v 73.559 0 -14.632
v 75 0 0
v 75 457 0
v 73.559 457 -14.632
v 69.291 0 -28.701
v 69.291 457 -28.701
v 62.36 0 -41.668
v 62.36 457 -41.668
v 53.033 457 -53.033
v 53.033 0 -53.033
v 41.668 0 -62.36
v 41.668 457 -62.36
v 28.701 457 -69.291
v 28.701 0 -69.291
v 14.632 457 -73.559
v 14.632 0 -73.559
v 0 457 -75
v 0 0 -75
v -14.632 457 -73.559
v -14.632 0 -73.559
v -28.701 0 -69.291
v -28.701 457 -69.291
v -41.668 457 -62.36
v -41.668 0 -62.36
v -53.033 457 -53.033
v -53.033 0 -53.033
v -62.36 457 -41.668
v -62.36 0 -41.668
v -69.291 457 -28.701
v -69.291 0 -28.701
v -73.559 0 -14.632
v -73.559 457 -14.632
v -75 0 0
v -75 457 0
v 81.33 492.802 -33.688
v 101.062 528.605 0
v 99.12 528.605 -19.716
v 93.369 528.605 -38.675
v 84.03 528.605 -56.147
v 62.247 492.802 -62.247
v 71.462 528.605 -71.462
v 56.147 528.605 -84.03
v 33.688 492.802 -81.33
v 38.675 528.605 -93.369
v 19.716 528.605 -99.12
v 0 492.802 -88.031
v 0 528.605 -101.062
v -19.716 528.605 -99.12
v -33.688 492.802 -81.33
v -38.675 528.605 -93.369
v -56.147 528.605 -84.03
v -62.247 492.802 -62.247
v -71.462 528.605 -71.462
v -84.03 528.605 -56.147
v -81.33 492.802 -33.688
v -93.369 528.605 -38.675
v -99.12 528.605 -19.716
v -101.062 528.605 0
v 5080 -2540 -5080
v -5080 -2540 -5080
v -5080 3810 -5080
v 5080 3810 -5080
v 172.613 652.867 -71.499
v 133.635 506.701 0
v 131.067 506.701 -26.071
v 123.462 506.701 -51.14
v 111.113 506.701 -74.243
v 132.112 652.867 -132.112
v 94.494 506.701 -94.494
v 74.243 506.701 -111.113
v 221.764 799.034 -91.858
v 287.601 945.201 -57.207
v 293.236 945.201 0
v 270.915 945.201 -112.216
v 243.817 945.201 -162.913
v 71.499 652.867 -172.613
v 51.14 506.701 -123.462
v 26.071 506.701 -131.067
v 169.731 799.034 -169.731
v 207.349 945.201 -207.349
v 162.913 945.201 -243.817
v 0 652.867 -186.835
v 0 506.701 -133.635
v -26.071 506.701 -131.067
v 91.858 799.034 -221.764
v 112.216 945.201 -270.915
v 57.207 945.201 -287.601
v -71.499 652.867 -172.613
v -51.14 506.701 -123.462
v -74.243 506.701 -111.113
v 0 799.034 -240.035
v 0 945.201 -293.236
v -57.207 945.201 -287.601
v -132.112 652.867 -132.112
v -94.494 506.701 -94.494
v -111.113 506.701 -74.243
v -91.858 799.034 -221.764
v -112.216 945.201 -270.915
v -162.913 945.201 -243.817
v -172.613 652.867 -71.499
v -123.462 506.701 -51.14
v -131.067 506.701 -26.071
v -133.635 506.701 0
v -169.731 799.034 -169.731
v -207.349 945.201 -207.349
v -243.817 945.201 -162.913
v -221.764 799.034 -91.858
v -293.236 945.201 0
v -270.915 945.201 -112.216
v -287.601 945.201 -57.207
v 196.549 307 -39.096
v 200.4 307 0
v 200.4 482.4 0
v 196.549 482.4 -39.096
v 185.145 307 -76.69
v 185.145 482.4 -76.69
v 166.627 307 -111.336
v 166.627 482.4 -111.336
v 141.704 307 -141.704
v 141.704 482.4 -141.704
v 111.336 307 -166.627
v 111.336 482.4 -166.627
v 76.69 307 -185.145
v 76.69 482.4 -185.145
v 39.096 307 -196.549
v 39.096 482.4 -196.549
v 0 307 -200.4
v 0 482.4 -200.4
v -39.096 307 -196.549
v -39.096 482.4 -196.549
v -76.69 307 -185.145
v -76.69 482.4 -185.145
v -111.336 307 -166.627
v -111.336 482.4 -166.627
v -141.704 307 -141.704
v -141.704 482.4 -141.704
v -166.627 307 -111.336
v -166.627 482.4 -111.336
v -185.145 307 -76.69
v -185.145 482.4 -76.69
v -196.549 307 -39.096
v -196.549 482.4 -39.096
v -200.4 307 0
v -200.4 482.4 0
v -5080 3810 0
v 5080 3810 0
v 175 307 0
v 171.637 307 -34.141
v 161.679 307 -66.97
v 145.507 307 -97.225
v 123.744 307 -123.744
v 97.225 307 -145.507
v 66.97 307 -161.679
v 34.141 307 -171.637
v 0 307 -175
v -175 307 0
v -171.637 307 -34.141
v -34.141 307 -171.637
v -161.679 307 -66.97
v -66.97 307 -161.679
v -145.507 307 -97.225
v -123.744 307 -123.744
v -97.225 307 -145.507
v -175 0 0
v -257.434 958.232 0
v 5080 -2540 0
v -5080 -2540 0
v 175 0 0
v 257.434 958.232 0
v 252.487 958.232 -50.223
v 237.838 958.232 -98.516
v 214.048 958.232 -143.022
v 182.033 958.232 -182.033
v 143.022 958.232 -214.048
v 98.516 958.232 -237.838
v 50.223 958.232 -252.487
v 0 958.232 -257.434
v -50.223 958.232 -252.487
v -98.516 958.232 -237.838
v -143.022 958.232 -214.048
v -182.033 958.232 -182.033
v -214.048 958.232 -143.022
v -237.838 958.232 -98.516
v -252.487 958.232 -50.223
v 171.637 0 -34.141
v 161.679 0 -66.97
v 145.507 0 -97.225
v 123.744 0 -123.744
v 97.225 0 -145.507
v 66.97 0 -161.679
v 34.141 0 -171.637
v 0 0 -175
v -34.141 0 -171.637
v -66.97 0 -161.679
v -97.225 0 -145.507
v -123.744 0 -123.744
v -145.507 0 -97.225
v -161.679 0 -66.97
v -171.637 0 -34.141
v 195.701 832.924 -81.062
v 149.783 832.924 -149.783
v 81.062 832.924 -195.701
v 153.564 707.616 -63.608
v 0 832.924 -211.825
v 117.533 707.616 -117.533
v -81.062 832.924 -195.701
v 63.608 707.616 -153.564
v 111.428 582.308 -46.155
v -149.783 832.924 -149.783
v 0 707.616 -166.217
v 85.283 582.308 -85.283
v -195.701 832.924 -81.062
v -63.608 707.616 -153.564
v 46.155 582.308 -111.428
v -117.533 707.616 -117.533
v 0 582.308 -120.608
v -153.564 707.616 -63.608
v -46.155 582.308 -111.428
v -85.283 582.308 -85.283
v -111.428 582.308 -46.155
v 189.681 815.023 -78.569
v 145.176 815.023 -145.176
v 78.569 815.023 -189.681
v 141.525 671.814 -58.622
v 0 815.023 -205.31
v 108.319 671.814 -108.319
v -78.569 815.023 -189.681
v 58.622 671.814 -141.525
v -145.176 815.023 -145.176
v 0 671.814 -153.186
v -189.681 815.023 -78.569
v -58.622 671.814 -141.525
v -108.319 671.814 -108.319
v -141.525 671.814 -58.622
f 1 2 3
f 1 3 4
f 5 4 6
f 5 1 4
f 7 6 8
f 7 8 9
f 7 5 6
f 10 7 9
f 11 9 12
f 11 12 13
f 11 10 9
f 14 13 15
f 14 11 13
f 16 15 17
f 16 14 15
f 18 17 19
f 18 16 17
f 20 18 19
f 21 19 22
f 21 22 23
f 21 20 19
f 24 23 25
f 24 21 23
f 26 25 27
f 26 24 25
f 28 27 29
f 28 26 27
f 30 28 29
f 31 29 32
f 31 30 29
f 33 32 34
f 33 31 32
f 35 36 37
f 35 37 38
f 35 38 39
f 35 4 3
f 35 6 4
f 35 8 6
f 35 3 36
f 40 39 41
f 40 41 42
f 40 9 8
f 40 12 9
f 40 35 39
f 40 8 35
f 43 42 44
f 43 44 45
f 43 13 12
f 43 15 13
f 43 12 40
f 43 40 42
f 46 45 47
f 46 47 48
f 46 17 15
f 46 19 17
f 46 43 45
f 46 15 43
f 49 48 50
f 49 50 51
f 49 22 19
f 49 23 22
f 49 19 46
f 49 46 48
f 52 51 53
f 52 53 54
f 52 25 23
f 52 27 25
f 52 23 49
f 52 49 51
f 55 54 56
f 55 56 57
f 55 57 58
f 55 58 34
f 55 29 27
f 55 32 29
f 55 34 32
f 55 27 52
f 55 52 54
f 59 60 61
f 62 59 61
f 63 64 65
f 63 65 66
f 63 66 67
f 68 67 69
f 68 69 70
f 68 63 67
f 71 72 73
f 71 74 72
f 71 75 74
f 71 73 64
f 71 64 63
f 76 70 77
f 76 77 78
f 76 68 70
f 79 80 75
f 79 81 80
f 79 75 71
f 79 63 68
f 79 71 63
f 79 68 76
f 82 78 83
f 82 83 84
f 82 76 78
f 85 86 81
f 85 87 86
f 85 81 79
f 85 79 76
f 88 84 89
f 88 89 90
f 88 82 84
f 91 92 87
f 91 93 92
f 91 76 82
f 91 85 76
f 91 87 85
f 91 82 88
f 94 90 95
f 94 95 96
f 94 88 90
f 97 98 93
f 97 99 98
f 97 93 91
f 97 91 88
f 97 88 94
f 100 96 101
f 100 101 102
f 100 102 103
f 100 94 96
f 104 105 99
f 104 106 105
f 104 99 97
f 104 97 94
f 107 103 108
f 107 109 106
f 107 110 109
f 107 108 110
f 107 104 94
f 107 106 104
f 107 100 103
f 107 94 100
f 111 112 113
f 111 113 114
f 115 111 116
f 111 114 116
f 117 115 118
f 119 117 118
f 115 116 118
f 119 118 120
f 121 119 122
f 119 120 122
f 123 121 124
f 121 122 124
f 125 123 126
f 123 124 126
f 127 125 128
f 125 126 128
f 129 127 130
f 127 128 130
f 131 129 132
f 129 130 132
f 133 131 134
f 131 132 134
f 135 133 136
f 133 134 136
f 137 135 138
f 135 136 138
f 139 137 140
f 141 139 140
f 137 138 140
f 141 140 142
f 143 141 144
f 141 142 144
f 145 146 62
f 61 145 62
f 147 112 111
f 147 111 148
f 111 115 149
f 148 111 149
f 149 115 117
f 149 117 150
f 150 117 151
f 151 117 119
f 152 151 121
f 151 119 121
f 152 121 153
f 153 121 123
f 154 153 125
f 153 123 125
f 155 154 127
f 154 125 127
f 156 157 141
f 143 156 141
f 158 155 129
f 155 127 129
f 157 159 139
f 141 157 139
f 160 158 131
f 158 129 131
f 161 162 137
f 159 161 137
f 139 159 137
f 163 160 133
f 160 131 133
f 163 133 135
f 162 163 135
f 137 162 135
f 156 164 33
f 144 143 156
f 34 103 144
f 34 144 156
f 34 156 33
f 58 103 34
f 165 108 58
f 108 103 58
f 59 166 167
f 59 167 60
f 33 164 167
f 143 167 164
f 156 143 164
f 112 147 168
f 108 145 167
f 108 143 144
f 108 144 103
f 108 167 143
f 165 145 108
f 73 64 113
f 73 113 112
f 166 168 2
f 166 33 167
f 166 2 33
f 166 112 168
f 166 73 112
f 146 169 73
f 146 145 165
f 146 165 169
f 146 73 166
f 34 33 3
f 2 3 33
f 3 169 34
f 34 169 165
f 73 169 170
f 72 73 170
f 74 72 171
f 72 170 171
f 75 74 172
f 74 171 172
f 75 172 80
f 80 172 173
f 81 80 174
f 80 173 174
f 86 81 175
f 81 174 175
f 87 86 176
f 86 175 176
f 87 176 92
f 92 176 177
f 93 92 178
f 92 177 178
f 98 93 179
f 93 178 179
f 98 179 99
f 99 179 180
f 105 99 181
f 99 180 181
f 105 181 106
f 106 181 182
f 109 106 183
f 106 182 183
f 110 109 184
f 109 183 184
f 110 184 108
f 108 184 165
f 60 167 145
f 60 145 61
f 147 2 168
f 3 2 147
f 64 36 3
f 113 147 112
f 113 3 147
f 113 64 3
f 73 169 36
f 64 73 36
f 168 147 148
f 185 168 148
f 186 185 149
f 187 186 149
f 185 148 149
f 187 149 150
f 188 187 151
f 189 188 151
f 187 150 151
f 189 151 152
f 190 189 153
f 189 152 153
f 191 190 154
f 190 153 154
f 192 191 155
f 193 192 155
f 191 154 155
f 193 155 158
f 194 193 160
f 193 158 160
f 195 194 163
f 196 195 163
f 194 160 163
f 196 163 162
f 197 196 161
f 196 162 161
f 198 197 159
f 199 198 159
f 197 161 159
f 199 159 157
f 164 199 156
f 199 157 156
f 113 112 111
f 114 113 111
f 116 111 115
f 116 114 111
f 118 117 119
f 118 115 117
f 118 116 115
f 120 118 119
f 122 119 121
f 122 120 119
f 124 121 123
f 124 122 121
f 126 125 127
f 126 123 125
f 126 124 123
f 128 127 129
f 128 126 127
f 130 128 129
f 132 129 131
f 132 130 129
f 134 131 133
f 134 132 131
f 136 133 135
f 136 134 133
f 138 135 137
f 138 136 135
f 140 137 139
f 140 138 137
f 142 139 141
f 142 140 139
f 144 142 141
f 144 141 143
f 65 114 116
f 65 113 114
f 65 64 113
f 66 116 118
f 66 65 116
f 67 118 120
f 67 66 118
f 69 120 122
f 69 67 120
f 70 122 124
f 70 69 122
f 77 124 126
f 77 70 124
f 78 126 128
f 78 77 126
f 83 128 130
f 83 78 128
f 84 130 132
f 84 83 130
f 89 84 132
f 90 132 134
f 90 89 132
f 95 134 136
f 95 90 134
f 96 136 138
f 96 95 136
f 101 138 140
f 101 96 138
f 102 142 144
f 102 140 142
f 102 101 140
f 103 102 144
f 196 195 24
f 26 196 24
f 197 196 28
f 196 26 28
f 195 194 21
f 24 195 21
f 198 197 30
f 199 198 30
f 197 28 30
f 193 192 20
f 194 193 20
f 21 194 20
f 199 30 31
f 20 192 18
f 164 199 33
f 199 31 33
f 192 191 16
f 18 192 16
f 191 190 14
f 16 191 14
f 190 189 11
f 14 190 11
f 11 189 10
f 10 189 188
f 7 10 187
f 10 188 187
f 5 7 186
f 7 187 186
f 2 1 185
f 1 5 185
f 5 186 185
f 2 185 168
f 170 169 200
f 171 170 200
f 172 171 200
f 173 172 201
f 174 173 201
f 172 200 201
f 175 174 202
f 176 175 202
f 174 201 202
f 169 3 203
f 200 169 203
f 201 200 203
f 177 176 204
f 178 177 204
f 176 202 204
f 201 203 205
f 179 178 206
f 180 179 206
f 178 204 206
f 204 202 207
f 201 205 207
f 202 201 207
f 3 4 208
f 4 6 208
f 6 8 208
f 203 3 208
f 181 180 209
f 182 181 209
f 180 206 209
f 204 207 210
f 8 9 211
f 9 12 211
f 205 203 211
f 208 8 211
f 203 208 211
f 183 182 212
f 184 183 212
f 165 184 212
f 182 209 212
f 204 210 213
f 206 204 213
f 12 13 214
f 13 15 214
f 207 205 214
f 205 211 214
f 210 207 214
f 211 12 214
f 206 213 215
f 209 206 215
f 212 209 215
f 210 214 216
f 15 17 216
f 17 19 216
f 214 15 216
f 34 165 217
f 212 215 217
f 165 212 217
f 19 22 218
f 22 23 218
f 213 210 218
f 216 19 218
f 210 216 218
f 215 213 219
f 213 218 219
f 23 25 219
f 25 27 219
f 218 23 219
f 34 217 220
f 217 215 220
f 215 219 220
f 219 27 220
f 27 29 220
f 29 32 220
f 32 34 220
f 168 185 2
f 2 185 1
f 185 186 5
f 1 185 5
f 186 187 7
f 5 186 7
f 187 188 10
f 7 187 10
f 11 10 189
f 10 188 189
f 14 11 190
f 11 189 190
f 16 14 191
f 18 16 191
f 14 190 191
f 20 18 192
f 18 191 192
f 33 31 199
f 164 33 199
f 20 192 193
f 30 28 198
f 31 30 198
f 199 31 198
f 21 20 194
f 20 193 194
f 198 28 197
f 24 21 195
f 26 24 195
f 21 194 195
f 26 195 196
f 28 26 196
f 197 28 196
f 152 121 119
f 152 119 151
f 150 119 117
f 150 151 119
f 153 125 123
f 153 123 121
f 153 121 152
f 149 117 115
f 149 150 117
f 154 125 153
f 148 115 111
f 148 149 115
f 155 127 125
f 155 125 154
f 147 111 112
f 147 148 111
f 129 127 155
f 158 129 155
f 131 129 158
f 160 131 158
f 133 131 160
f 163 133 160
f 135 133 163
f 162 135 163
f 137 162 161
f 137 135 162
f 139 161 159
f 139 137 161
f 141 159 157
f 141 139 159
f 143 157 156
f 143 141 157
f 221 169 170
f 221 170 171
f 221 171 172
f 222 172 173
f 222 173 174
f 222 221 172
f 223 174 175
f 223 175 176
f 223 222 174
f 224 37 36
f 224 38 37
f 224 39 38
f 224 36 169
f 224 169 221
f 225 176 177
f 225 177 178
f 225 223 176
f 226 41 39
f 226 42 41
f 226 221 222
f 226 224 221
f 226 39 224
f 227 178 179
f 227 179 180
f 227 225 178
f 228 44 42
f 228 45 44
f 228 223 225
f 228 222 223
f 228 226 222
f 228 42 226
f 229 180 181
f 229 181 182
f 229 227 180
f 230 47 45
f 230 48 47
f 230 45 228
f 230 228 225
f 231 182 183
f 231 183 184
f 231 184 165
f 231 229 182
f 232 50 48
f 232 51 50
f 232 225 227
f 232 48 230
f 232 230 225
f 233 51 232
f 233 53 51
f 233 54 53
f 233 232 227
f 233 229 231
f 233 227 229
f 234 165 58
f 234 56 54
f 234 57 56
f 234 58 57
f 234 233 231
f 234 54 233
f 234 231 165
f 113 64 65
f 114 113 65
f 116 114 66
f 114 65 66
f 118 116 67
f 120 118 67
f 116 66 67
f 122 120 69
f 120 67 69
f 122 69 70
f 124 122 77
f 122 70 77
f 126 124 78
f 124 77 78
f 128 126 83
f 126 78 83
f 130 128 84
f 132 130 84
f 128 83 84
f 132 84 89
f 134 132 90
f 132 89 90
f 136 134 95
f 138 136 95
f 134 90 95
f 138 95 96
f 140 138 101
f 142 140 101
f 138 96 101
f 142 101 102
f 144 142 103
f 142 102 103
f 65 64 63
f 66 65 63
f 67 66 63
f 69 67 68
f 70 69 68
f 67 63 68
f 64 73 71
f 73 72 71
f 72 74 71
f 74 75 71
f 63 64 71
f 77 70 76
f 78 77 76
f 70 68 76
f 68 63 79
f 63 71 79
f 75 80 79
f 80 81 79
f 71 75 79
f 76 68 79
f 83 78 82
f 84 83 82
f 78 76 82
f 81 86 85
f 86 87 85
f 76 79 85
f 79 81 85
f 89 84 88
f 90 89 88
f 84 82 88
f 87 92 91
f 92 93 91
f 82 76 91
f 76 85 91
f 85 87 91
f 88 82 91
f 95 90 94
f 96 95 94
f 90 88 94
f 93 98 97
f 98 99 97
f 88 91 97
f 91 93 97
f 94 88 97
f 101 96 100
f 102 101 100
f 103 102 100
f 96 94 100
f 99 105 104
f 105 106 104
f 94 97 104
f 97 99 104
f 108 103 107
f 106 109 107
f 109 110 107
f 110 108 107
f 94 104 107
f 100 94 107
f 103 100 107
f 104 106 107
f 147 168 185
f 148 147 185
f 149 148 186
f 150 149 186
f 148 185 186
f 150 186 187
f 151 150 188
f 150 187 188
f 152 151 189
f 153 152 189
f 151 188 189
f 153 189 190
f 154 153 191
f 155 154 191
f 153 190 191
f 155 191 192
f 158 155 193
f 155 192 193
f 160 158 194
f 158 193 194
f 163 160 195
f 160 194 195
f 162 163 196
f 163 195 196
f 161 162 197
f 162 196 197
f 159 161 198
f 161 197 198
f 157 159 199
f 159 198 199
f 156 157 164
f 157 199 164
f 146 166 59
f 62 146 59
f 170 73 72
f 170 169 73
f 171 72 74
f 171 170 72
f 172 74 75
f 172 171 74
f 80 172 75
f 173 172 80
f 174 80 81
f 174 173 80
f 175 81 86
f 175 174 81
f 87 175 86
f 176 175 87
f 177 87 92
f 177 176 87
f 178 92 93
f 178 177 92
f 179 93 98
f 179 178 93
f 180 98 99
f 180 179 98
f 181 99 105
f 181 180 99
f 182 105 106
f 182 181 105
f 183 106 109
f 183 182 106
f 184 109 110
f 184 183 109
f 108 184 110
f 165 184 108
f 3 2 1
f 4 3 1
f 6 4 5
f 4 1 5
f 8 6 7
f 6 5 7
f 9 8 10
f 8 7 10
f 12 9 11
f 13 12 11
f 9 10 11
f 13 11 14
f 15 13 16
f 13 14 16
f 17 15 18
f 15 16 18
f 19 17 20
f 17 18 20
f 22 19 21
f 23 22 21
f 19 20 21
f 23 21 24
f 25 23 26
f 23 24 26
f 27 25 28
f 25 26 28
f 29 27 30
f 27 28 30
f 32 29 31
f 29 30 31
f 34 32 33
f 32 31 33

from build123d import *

# Parameters (mm, degrees)
SKETCH1_R           = 175
SKETCH1_R_2         = 75
BOSS_EXTRUDE1_DEPTH = 457
SKETCH3_W           = 10160
SKETCH3_H           = 6350
BOSS_EXTRUDE2_DEPTH = 5080
SKETCH4_W           = 13475.768327993
SKETCH4_H           = 8367.586519284
CUT_EXTRUDE1_DEPTH  = 8132.96778154


with BuildPart() as part:
    # Sketch1 → Boss-Extrude1 (new body)
    with BuildSketch(Plane(origin=(0, 0, 0), x_dir=(1, 0, 0), z_dir=(0, 1, 0))):
        with Locations(Location((0, 0, 0), (0, 0, 270))):
            Circle(SKETCH1_R)
        with Locations(Location((0, 0, 0), (0, 0, 270))):
            Circle(SKETCH1_R_2, mode=Mode.SUBTRACT)
    extrude(amount=BOSS_EXTRUDE1_DEPTH)

    # Sketch2 → Revolve1 (revolve)
    with BuildSketch(Plane.XY, mode=Mode.PRIVATE) as revolve1_sk:
        Polygon((-175, 307), (-200.4, 307), (-200.4, 482.4), (-133.634704911, 506.700580094), (-293.235833302, 945.201076466), (-257.43354445, 958.232043927), (-101.061934921, 528.604577704), (-75, 457), (-175, 457), align=None)
    revolve(revolve1_sk.sketch.rotate(Axis((0, 0, 0), (0, 1, 0)), 270), axis=Axis((0, 0, 0), (0, 1, 0)))


with BuildPart() as body_2:
    # Sketch3 → Boss-Extrude2 (new, symmetric)
    with BuildSketch(Plane(origin=(0, 0, 0), x_dir=(0, 0, -1), z_dir=(1, 0, 0))):
        with Locations((0, 635)):
            Rectangle(SKETCH3_W, SKETCH3_H)
    extrude(amount=BOSS_EXTRUDE2_DEPTH, both=True)

    # Intersect1: read off the stored shape, not the designer's step
    # Intersect1 outline → Intersect1 (revolve, cut)
    with BuildSketch(Plane.XY):
        Polygon((75, 457), (75, 0), (175, 0), (175, 307), (200.4, 307), (200.4, 482.4), (133.634704911, 506.700580094), (293.235833302, 945.201076466), (257.43354445, 958.232043927), align=None)
    revolve(axis=Axis((0, 0, 0), (0, 1, 0)), mode=Mode.SUBTRACT)


with BuildPart() as cut_extrude1_tool:
    # Sketch4 → Cut-Extrude1 (new, through all)
    with BuildSketch(Plane.XY):
        with Locations((454.179344916, 464.014834855)):
            Rectangle(SKETCH4_W, SKETCH4_H)
    extrude(amount=CUT_EXTRUDE1_DEPTH)


with BuildPart() as part_1:
    add(part.part)

    # Cut-Extrude1: cut by cut_extrude1_tool
    add(cut_extrude1_tool.part, mode=Mode.SUBTRACT)


with BuildPart() as body_2_1:
    add(body_2.part)

    # Cut-Extrude1: cut by cut_extrude1_tool
    add(cut_extrude1_tool.part, mode=Mode.SUBTRACT)


solid = Compound([part_1.part, body_2_1.part])
